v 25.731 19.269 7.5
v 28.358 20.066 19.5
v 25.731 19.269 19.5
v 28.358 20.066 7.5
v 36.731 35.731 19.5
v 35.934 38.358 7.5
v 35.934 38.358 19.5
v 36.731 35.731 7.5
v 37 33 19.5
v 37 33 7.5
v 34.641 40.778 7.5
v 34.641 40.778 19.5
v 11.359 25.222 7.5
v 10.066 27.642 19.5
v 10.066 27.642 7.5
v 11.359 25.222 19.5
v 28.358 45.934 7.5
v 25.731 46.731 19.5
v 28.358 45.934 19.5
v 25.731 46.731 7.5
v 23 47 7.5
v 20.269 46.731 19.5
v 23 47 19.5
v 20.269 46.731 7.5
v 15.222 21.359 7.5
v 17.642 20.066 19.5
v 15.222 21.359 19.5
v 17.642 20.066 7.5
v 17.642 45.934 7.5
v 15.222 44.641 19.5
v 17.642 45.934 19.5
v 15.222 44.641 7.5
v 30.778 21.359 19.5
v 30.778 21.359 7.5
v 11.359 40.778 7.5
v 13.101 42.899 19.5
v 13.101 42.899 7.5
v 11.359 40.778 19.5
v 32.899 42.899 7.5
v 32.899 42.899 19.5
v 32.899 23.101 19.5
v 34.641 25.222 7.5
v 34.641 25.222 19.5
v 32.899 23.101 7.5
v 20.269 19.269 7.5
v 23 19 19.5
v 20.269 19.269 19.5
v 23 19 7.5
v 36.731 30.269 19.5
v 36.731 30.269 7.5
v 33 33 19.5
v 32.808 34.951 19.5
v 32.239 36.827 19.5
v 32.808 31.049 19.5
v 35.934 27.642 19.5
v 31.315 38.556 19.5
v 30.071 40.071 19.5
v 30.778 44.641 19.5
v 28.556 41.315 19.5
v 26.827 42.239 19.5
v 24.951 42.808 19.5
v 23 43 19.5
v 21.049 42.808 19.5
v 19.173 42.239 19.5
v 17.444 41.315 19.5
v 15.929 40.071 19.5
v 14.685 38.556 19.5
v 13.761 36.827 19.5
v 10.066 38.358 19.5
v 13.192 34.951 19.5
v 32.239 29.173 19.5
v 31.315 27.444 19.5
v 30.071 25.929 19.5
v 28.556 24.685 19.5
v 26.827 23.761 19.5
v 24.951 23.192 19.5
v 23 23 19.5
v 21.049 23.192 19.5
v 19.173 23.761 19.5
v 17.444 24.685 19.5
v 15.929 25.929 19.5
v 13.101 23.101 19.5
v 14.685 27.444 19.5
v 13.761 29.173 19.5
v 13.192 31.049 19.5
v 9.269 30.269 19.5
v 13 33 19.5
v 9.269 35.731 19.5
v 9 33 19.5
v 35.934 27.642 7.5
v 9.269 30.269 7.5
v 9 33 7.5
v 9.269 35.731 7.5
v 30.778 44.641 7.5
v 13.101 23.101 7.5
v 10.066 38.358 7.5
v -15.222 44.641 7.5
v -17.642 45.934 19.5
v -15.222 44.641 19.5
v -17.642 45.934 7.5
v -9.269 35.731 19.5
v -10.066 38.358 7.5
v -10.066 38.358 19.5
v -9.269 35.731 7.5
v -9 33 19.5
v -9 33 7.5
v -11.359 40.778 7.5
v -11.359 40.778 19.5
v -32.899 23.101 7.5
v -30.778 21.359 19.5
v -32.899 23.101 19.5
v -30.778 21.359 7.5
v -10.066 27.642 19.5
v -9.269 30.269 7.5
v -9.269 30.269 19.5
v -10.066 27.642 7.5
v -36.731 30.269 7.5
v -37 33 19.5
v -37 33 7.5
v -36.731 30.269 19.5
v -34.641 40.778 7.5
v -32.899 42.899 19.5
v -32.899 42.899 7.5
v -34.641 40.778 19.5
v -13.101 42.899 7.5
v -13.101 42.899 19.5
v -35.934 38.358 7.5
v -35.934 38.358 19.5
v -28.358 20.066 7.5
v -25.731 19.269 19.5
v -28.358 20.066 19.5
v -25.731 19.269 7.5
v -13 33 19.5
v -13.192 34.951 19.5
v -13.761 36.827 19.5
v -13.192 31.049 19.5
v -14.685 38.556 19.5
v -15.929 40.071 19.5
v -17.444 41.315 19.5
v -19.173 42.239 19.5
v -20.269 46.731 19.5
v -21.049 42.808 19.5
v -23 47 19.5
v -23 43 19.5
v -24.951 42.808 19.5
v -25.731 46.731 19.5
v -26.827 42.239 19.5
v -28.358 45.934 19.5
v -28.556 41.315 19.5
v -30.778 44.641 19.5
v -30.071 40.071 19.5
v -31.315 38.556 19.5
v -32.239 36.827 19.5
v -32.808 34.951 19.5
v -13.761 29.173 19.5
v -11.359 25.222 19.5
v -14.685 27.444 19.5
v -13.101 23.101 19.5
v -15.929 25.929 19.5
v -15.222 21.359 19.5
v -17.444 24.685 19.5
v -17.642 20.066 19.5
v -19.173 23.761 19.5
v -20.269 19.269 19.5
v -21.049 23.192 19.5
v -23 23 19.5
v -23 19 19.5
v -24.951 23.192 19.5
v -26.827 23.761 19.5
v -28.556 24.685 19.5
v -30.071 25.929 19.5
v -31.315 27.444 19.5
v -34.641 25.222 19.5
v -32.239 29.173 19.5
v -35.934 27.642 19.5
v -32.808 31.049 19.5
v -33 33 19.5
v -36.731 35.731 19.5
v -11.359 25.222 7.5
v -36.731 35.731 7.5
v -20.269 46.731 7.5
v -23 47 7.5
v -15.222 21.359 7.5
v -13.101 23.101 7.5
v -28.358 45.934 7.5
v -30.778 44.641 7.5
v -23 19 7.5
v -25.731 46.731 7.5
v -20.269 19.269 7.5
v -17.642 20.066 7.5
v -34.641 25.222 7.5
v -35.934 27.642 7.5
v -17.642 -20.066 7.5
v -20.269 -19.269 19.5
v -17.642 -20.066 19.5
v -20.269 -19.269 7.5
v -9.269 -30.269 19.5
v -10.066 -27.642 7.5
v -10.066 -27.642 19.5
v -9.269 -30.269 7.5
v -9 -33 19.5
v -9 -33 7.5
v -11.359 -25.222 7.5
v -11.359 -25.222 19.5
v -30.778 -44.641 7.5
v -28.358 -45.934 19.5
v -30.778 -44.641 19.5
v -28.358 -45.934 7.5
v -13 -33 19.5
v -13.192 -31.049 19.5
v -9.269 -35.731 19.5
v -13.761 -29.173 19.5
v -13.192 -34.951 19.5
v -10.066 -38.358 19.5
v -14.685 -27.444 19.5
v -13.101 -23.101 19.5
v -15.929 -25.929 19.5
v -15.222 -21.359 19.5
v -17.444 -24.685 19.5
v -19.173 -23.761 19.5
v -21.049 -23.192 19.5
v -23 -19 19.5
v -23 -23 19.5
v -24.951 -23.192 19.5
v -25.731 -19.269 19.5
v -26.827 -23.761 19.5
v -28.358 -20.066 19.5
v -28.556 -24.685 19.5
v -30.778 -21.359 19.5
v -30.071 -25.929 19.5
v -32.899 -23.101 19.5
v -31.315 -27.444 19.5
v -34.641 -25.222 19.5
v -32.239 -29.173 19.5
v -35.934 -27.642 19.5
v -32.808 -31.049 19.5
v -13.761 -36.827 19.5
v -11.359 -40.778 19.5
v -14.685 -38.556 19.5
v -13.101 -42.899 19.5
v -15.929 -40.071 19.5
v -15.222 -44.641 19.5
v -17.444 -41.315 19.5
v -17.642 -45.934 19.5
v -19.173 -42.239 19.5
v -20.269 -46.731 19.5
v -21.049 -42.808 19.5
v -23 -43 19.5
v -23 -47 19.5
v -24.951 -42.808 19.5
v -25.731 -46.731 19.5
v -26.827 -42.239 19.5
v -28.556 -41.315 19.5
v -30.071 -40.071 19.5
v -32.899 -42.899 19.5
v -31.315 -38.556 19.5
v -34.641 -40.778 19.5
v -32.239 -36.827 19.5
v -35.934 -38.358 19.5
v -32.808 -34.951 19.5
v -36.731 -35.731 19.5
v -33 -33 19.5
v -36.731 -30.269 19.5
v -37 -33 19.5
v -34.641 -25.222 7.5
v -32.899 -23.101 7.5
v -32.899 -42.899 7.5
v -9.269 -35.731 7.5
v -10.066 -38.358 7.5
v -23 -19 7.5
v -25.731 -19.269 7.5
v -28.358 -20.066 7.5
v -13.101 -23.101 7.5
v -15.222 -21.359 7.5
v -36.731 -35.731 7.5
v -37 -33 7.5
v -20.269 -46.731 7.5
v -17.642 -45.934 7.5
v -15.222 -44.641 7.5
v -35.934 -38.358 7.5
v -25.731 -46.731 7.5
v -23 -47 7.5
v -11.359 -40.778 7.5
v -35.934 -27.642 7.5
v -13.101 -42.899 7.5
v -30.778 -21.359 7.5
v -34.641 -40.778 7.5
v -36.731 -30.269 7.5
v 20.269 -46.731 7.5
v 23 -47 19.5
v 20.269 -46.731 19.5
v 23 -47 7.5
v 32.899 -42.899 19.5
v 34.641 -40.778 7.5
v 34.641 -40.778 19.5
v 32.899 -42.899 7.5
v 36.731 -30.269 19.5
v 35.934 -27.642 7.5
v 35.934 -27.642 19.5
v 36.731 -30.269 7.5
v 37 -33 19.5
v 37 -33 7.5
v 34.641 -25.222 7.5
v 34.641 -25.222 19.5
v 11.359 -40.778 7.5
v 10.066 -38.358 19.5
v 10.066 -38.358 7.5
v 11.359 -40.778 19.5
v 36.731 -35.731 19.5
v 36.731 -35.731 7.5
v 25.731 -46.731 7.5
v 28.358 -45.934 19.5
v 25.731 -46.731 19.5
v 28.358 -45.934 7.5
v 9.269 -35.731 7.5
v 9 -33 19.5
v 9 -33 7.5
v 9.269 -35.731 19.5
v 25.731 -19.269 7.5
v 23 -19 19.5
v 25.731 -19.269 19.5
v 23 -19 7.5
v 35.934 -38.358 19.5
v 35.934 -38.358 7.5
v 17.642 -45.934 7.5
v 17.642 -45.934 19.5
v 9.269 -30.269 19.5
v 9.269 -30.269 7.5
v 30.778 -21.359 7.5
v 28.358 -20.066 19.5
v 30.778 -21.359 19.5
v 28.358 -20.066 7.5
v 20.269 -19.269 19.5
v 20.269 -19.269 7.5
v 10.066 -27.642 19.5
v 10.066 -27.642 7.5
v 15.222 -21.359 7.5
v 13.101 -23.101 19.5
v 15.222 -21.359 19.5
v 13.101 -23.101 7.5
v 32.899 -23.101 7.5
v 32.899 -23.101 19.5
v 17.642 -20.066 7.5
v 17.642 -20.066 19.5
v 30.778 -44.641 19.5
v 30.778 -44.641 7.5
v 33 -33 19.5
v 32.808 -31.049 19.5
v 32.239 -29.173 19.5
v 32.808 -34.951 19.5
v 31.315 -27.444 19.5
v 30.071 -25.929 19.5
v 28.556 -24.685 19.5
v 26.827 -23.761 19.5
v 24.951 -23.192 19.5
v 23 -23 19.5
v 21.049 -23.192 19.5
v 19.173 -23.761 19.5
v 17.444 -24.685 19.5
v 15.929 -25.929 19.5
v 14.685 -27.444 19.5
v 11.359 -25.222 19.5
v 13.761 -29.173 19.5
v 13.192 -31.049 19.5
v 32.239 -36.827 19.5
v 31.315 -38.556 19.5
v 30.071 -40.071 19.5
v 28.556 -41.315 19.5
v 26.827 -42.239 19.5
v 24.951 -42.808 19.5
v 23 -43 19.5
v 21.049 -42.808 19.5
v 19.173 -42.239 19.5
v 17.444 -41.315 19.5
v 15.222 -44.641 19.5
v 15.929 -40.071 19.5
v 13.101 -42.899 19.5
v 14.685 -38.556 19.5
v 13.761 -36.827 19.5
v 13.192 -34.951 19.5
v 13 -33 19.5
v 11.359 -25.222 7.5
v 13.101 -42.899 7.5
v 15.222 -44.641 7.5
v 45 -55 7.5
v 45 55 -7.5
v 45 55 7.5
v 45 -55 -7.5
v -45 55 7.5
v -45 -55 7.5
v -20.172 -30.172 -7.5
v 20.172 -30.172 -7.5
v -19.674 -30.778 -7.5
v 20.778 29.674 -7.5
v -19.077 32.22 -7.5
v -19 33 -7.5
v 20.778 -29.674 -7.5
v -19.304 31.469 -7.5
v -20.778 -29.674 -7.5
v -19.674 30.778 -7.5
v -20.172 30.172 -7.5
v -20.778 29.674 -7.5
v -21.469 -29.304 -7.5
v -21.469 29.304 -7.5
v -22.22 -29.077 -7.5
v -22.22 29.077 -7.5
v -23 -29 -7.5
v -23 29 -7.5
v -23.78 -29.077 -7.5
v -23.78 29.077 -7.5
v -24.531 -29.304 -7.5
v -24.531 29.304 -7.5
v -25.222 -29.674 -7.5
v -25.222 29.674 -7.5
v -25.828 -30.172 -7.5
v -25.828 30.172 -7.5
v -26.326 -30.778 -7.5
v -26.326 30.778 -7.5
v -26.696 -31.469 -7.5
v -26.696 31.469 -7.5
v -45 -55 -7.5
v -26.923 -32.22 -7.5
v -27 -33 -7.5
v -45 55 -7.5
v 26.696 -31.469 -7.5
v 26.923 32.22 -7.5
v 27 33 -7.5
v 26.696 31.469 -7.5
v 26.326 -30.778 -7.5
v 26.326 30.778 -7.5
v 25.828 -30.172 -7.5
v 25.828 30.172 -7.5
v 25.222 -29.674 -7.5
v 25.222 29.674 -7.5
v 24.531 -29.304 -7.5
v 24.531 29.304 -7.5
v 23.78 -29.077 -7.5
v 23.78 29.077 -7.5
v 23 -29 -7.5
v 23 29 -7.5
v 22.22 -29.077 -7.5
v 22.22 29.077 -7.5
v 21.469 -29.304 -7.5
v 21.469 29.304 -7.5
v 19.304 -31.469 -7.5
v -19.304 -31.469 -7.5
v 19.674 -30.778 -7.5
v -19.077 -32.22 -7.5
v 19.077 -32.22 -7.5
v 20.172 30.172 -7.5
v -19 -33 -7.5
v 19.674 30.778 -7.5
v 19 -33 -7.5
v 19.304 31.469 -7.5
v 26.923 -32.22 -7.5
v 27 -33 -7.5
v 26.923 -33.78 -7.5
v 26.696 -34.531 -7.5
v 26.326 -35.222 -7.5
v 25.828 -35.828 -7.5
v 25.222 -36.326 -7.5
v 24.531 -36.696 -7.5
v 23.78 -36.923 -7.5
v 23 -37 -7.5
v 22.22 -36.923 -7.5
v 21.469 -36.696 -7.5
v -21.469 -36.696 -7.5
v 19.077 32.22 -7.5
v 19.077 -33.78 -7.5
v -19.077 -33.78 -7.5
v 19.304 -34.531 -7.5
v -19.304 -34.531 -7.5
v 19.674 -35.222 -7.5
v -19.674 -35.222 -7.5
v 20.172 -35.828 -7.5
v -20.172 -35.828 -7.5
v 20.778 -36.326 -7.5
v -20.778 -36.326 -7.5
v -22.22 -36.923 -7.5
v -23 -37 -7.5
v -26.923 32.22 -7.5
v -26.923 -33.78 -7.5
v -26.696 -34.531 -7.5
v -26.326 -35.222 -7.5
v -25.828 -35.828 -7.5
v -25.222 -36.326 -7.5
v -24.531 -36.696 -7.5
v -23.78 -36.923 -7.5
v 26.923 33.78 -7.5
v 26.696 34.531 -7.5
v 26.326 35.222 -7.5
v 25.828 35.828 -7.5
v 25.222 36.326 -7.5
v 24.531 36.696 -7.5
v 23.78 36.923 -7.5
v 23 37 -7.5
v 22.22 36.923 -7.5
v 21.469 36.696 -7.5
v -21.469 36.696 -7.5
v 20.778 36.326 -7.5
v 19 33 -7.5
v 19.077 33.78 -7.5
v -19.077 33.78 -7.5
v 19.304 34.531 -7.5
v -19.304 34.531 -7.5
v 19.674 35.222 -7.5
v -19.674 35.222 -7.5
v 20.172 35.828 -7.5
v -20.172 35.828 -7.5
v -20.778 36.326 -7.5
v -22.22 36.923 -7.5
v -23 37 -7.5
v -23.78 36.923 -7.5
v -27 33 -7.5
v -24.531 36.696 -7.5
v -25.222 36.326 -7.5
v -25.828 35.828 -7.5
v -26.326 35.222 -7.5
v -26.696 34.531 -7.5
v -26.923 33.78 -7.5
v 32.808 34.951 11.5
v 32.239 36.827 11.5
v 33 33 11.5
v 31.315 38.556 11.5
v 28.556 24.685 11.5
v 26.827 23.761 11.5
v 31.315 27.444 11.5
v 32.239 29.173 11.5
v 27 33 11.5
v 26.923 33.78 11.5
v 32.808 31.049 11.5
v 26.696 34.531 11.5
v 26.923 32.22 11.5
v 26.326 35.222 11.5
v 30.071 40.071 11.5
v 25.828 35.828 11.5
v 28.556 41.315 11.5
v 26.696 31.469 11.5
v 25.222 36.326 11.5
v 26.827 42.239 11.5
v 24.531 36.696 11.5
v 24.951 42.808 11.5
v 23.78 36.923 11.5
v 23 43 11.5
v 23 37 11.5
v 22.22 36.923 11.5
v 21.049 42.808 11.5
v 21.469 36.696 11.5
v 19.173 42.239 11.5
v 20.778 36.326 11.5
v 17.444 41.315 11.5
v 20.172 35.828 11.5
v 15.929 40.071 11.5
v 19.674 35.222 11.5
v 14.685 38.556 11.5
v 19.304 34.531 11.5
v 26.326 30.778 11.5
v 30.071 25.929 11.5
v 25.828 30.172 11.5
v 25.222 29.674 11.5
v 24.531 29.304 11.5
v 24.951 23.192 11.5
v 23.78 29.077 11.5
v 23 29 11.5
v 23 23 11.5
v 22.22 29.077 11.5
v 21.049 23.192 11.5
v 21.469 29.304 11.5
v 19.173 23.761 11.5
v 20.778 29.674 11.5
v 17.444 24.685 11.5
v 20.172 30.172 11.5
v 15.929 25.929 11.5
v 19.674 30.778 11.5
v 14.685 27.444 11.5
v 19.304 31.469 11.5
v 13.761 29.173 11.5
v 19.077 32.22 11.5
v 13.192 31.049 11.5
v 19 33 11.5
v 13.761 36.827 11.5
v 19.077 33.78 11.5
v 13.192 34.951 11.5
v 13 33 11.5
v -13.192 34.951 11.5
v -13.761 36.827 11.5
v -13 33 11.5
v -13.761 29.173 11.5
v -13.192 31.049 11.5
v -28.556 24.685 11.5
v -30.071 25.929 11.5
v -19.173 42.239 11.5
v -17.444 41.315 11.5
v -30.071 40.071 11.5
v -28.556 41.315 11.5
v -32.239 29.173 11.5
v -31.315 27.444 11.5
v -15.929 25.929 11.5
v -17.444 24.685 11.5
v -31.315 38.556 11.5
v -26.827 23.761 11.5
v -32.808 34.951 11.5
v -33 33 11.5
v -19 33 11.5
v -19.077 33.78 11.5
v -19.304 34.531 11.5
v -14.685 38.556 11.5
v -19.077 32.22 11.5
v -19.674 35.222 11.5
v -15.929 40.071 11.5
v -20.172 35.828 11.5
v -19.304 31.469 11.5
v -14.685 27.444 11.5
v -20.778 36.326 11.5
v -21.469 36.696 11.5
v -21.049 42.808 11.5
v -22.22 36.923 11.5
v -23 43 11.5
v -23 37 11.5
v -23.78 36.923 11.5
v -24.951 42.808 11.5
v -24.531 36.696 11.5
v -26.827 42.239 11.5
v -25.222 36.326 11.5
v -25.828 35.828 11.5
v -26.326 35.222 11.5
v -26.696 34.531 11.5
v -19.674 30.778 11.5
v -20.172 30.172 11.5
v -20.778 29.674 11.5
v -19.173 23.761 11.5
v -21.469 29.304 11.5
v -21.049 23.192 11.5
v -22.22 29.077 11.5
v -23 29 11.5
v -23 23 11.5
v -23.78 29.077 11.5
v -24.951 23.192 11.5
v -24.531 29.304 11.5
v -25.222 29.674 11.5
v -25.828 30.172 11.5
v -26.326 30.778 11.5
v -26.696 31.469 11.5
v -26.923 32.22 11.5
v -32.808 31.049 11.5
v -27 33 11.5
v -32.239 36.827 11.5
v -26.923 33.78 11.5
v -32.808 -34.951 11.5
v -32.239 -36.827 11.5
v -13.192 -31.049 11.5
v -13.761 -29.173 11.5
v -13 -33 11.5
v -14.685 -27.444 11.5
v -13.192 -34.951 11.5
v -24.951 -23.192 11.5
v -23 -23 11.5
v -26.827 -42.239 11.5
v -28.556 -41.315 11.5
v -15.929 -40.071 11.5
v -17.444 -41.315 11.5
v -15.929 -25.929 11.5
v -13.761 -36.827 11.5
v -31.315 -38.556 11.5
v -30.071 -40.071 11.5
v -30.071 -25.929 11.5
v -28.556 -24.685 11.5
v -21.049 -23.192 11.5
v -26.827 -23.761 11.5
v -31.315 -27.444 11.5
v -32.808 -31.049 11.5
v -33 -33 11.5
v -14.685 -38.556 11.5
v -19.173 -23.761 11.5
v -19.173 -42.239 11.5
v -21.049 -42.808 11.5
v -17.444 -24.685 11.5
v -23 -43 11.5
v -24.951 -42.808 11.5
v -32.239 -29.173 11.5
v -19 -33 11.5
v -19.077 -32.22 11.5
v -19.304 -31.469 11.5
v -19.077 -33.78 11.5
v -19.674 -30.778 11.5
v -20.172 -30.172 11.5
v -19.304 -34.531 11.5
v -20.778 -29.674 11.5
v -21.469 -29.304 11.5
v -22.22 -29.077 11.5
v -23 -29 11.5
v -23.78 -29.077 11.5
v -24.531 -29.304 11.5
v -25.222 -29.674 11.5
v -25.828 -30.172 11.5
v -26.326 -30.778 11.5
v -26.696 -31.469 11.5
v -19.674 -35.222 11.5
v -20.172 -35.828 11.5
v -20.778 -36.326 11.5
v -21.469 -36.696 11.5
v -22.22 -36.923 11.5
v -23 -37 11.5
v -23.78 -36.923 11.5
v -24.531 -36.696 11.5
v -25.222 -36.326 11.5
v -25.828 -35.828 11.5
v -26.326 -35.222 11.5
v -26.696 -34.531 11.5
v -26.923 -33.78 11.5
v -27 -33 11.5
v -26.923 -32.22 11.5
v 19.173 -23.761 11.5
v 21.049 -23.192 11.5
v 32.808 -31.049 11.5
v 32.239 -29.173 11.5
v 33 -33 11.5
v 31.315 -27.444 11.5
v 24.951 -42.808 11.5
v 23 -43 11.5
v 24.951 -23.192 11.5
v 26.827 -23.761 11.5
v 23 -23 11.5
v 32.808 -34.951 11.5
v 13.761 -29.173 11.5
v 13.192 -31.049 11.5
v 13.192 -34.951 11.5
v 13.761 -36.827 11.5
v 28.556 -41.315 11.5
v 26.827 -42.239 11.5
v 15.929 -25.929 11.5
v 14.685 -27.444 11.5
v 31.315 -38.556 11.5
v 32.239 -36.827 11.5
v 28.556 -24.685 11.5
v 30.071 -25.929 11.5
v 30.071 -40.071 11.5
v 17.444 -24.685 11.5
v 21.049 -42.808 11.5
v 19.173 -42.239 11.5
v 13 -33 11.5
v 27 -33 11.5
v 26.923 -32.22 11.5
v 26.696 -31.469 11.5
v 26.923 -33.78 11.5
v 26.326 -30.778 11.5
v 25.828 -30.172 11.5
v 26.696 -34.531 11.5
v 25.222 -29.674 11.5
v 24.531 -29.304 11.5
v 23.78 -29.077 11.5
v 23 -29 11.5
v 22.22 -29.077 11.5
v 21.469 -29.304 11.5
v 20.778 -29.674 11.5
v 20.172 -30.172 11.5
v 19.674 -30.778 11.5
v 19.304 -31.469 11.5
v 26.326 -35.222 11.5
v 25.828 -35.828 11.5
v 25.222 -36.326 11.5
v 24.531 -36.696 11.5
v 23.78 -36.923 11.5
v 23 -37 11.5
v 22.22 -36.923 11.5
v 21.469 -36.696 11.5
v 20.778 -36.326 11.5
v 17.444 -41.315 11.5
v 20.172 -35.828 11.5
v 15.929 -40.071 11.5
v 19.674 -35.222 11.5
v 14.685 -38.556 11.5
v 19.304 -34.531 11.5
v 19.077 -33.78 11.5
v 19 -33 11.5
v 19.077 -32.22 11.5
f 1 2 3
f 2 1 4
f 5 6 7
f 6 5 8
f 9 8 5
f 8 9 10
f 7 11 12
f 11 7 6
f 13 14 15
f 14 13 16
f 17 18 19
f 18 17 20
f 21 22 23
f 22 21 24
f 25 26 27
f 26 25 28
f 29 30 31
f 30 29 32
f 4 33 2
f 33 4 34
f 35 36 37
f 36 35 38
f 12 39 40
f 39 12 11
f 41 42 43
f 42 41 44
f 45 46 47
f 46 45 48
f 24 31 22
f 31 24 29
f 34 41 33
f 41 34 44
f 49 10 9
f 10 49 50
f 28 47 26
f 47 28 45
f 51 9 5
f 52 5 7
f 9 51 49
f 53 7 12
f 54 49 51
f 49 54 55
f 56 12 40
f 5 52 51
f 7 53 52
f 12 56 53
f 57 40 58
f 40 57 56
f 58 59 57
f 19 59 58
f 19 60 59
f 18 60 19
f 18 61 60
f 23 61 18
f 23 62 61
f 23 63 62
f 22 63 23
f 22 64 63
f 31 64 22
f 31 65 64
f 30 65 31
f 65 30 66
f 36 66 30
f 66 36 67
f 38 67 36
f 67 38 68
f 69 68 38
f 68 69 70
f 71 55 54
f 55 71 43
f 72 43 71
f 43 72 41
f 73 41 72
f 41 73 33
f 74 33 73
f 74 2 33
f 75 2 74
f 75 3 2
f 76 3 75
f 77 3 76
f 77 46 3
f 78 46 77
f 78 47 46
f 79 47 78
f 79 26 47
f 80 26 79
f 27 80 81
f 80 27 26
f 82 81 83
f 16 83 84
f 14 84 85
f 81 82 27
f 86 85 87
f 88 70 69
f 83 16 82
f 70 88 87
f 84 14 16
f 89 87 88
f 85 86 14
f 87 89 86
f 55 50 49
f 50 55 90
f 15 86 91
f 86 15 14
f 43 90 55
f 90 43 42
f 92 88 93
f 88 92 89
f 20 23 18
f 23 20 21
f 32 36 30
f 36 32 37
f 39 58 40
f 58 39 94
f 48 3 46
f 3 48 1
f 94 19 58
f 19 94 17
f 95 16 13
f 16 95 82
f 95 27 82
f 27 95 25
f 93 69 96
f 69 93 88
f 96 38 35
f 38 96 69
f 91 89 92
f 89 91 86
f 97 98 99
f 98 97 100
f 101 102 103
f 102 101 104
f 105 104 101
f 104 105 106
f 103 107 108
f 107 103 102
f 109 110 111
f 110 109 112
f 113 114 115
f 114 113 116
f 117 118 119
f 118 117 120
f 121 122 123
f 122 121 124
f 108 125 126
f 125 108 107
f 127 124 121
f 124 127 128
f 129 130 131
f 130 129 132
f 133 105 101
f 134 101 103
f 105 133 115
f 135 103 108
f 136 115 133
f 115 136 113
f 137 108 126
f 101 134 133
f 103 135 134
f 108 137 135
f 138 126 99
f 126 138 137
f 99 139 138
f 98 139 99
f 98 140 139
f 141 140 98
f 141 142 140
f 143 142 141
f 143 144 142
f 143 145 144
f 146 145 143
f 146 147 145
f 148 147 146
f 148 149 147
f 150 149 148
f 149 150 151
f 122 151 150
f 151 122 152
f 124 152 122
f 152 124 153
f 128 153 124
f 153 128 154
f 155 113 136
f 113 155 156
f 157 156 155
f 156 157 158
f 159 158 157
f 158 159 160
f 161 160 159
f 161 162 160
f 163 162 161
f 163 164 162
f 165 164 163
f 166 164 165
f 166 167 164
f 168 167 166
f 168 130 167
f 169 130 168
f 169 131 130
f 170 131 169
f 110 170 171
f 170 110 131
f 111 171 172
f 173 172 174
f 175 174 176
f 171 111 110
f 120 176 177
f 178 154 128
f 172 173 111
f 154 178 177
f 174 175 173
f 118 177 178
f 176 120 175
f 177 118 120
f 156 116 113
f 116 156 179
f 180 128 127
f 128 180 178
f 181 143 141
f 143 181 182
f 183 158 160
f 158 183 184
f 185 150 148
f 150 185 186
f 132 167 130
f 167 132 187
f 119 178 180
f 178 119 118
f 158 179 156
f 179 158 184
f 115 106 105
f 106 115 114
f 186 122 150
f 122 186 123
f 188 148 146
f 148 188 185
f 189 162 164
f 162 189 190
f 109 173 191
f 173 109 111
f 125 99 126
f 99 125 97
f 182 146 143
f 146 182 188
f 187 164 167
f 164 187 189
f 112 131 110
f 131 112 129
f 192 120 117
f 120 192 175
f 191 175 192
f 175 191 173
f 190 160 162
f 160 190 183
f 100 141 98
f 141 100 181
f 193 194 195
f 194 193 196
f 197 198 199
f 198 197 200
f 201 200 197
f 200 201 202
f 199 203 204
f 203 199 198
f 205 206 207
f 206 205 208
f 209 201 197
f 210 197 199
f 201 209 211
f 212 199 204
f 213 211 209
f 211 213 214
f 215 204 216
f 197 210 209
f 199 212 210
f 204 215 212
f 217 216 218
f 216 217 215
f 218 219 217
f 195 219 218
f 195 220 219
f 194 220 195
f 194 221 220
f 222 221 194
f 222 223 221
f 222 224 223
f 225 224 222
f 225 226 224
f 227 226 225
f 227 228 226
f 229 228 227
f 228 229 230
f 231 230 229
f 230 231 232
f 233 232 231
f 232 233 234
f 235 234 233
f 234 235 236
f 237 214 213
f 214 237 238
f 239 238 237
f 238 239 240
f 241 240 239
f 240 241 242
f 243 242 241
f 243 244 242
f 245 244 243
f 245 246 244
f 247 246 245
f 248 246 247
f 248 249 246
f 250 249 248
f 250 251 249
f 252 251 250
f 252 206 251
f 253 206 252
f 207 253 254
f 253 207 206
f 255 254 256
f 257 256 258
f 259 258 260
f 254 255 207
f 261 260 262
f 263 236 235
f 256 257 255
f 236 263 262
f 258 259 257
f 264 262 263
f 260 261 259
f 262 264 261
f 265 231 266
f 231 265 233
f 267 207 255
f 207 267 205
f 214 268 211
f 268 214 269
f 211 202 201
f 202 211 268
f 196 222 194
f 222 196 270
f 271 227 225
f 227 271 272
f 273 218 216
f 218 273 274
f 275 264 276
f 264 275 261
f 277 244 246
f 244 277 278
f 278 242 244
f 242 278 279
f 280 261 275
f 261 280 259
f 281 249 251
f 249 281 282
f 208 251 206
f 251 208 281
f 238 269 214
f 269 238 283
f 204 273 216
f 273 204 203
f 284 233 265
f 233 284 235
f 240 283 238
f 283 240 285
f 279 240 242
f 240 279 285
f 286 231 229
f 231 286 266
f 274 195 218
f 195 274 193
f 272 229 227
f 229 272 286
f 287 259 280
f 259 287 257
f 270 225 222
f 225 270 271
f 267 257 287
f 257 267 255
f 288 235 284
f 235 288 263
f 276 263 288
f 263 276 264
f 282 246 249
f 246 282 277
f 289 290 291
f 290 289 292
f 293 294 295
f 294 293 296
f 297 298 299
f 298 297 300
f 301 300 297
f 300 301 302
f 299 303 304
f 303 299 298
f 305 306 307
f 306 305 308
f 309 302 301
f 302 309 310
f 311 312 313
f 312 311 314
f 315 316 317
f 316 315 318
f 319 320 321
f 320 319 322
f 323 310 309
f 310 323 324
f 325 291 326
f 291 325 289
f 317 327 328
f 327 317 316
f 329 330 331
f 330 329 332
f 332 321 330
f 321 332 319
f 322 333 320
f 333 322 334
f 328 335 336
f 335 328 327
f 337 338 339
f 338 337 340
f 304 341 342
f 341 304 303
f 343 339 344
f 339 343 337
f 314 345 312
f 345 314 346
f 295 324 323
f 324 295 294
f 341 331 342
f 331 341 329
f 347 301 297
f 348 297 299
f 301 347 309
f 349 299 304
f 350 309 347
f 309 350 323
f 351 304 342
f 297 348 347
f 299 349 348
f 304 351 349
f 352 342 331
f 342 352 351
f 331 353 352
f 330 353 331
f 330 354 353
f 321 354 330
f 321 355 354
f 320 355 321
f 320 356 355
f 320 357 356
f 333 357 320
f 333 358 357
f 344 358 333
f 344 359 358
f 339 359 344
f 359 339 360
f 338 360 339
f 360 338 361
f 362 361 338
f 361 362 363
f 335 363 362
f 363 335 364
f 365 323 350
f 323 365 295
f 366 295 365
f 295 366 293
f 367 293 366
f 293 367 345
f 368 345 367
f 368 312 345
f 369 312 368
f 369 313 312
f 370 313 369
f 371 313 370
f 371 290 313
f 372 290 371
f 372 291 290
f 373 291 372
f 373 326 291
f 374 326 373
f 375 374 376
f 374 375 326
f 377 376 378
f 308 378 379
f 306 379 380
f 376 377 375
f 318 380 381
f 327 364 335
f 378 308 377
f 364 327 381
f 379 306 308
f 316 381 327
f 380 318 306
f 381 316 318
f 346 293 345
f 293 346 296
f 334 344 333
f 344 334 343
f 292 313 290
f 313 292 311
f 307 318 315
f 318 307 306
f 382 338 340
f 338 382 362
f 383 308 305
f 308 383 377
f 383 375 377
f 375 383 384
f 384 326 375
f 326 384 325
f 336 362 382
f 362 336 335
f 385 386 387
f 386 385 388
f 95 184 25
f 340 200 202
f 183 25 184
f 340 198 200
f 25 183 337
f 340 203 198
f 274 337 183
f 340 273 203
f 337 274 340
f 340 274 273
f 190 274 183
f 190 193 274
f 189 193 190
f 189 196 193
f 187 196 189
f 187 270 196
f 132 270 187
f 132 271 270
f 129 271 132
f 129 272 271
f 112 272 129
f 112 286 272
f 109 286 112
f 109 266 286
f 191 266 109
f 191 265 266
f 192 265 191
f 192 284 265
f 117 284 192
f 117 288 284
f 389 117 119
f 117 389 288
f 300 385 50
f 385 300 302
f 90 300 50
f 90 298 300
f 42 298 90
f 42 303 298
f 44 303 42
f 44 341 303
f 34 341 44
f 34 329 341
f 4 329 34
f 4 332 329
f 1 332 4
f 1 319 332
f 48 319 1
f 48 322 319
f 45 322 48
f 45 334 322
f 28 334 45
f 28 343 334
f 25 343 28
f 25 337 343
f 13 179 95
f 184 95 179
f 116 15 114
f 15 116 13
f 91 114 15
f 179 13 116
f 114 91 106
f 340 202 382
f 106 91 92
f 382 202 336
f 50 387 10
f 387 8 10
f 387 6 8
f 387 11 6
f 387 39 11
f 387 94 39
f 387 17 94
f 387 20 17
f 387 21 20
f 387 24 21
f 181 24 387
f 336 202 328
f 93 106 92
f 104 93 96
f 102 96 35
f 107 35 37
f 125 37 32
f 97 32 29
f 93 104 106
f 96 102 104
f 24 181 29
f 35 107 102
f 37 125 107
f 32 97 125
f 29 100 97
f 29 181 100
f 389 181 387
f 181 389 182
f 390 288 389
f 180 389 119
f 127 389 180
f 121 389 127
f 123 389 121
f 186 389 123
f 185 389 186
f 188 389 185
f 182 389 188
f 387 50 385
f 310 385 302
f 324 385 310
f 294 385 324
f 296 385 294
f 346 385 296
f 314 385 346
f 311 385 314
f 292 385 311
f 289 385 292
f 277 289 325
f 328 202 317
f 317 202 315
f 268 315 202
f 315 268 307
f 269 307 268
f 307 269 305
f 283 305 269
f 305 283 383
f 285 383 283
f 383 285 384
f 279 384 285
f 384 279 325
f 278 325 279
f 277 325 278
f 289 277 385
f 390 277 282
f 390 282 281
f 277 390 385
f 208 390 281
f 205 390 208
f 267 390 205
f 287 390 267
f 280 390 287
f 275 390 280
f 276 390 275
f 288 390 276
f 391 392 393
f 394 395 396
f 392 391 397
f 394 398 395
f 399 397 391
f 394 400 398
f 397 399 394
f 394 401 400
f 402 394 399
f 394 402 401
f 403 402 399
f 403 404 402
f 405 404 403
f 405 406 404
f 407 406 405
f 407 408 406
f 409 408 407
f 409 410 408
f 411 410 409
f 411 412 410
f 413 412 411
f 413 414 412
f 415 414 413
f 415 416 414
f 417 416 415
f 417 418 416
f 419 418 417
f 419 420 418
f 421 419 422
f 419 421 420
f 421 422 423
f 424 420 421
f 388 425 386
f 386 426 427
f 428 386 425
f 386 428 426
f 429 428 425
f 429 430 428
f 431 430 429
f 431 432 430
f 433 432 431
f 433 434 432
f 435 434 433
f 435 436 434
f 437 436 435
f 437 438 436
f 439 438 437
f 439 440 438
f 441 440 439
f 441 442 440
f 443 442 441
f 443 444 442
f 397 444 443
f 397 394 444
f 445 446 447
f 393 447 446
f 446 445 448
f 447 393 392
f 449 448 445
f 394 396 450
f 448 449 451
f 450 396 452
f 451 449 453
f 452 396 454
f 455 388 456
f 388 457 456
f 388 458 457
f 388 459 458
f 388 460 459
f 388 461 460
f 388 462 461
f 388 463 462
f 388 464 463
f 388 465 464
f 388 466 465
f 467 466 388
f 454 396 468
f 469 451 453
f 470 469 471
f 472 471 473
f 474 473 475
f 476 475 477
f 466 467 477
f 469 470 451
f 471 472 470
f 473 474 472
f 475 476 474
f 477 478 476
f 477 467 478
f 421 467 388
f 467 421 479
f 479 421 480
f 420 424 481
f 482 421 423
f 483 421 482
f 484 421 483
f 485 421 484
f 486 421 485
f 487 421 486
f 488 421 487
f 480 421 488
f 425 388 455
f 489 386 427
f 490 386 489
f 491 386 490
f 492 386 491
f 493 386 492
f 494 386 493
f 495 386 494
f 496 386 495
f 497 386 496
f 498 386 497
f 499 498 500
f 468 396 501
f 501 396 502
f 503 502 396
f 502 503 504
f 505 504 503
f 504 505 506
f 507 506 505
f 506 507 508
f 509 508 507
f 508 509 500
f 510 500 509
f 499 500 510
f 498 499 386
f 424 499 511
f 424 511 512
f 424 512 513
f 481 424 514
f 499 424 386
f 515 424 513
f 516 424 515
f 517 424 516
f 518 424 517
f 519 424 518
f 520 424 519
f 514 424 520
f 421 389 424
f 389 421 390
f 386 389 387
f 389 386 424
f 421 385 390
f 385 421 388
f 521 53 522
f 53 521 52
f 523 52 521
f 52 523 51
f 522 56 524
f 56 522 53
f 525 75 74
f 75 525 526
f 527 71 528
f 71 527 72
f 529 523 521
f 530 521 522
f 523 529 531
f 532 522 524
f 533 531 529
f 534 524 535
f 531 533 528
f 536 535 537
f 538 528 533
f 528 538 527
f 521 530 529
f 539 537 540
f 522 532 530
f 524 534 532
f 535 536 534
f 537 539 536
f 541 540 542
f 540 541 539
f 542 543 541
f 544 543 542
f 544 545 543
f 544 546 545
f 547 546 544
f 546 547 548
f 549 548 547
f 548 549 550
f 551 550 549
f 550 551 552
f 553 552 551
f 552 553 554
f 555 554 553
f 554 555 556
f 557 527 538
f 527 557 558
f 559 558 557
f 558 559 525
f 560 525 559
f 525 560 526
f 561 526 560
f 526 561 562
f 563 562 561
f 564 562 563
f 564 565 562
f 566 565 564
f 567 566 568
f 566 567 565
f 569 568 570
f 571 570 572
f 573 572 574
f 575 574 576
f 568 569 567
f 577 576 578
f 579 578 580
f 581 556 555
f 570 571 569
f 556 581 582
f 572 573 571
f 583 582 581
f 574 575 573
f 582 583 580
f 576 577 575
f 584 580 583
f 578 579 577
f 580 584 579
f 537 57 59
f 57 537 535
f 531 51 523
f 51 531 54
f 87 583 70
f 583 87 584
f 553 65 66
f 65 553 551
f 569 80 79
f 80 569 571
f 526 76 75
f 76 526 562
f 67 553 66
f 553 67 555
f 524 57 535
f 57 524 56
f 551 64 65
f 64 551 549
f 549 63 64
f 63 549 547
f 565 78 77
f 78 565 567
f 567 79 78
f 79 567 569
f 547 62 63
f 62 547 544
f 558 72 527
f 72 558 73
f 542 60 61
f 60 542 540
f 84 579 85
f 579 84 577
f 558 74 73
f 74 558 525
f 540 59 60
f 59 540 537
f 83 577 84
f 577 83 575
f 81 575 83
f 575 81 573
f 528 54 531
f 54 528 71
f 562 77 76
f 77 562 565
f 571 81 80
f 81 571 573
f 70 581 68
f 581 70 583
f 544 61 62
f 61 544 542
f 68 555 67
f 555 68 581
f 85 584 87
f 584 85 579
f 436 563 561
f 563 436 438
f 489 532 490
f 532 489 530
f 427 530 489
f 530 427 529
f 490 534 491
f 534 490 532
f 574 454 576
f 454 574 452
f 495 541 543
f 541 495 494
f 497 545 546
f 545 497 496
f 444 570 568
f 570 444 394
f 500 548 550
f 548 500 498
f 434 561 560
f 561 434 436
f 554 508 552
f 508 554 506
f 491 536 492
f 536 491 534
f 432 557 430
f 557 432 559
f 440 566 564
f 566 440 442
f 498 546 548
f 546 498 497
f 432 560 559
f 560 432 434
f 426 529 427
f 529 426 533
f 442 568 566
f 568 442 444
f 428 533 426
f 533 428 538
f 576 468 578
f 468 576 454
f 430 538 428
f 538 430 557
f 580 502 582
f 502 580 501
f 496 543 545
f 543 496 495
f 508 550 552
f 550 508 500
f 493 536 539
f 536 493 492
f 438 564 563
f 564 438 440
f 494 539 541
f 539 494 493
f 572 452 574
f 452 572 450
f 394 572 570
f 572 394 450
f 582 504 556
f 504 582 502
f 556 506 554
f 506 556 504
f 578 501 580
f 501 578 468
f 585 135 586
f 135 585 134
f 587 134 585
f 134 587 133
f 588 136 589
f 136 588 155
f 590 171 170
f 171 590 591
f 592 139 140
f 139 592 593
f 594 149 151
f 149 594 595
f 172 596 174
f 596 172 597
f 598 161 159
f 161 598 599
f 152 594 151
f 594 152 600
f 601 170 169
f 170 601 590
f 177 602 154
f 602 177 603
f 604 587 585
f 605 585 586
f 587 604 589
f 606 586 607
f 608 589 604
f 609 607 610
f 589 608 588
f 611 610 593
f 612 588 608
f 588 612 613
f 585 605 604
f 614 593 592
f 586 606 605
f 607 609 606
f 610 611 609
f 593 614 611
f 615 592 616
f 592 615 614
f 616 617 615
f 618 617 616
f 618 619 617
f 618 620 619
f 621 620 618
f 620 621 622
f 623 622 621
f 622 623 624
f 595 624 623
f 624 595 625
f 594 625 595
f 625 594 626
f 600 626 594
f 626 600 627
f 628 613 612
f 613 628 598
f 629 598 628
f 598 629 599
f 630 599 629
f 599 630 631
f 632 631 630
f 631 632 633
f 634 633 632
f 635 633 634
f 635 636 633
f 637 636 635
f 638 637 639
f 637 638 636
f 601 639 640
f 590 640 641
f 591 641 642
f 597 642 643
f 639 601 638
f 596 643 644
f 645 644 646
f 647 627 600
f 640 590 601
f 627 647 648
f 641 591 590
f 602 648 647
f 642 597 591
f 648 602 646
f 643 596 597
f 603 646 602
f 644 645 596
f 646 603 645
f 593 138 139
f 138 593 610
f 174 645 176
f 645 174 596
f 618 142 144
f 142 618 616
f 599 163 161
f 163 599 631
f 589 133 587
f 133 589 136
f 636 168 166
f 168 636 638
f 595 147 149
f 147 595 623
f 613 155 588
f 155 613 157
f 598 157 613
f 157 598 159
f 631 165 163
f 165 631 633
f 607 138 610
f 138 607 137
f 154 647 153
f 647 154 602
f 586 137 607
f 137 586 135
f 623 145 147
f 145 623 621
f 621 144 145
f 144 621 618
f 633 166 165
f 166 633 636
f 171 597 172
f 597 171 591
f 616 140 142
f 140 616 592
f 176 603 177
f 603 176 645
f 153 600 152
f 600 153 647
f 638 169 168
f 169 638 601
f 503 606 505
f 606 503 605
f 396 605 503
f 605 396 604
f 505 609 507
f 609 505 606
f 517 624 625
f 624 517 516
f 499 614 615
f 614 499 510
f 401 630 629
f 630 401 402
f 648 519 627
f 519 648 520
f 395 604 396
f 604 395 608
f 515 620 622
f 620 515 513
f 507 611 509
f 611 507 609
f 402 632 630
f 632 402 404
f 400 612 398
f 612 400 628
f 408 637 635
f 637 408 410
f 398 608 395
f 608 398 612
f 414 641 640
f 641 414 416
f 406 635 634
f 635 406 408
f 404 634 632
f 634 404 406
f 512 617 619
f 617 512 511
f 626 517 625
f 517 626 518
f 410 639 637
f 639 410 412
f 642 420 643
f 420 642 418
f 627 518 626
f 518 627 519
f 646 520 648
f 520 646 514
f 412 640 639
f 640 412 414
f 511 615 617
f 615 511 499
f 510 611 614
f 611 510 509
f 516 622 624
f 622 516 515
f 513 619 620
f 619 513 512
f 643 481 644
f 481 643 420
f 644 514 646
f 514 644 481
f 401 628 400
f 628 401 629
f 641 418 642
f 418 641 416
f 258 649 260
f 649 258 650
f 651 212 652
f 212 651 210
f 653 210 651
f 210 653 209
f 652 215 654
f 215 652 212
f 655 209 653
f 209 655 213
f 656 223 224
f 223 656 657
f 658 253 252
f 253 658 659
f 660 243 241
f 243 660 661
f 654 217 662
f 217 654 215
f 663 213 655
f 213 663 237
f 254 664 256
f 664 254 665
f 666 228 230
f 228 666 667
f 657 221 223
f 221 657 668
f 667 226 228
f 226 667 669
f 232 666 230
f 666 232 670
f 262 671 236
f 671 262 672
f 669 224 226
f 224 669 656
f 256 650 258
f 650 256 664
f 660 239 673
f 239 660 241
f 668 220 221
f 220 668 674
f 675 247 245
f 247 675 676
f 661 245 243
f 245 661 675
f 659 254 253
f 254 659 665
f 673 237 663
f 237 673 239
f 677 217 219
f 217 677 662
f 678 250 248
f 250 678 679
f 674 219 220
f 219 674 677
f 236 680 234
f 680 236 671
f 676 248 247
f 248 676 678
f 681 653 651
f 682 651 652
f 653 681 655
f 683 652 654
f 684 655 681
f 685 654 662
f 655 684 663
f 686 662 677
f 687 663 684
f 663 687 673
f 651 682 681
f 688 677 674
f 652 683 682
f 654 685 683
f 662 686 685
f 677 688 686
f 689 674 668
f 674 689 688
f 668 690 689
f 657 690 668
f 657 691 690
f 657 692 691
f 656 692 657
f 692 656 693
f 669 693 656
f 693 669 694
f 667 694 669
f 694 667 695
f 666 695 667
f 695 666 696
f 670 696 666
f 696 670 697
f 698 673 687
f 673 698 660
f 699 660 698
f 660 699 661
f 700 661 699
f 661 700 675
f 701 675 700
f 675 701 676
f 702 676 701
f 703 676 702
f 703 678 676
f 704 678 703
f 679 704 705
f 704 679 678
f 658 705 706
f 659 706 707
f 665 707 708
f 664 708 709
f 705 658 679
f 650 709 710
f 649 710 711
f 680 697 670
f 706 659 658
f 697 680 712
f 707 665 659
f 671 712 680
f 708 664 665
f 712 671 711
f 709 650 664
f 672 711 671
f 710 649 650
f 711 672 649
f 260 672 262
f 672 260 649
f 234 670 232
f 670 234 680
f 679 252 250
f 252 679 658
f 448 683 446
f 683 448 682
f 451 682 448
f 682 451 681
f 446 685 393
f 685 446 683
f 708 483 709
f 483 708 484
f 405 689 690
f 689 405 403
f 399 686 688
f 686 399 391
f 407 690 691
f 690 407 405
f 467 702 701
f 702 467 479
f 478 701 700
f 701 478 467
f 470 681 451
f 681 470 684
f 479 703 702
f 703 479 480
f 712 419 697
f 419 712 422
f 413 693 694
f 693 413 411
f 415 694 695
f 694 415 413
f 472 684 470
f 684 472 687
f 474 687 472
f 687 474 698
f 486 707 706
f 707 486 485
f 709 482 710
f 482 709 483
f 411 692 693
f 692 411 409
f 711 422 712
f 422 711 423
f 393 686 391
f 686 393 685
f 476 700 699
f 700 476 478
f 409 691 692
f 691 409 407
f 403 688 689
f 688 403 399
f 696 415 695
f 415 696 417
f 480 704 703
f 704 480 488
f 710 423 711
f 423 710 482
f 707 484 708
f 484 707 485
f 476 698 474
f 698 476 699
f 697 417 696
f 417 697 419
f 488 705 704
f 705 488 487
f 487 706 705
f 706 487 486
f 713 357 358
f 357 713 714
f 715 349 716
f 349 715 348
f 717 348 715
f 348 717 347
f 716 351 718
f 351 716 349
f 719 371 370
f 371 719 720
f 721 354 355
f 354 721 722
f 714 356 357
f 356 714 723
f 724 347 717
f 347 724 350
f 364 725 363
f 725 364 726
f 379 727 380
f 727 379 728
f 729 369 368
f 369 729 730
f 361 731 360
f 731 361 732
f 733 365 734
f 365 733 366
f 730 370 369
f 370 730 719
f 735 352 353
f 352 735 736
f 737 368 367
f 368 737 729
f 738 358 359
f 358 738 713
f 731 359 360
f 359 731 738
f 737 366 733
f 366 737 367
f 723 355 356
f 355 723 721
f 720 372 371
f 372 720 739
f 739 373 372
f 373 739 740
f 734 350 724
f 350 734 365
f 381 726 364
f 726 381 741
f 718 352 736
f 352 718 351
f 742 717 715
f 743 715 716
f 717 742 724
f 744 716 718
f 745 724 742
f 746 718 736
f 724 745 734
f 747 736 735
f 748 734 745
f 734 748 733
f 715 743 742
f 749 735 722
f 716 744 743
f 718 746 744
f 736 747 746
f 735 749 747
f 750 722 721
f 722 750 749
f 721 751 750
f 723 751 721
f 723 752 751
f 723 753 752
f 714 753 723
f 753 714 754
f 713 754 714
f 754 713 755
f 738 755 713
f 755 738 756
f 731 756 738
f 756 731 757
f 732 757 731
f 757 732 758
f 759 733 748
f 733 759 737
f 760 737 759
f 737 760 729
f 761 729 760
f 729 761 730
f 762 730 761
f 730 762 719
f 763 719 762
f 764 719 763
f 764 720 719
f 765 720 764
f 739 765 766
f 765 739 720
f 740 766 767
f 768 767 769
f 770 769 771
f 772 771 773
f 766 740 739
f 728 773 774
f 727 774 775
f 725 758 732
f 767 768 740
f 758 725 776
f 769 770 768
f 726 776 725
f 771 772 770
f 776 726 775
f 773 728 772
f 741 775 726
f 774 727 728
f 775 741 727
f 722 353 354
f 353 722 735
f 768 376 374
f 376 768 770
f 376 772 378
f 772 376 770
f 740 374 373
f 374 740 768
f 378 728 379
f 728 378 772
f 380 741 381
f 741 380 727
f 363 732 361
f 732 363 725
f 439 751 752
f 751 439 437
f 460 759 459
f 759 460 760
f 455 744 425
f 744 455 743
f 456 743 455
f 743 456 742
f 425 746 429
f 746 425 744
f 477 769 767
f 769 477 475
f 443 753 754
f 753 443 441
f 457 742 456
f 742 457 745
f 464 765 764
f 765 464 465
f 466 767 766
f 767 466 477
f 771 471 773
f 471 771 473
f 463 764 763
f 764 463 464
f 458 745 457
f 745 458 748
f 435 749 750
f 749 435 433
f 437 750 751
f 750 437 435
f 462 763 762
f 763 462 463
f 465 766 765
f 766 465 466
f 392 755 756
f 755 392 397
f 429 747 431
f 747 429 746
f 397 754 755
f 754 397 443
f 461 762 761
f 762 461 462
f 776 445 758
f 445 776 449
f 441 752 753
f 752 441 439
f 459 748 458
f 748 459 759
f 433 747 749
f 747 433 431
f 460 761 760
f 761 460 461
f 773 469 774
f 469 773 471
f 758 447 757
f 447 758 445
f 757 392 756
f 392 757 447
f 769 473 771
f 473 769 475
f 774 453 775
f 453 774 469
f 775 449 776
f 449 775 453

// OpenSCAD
$fn = 32;

// ----------------------------------------------------------------------
// Socket pad plate
// bosses with counterbored sockets for the screws
// ----------------------------------------------------------------------

// --- parameters (mm) ---
base_t = 15;            // base plate thickness
boss_h = 12;            // boss height above the base plate
boss_d = 28;            // boss diameter
socket_d = 20;          // socket diameter
socket_depth = 8;       // socket depth from the boss face
bolt_d = 8;             // screw clearance hole through the socket floor
plate = [90, 110, 15];  // overall size (x, y, z)
edge = 22;              // boss centre offset from the plate edge
pads = 4;               // boss count, one per corner

// --- derived feature positions (mm) ---
height = base_t + boss_h;        // = 27   overall height of the part
corner_x = plate[0] / 2 - edge;  // = 23   boss centre X
corner_y = plate[1] / 2 - edge;  // = 33   boss centre Y
feature_centers = [
  [corner_x, corner_y],
  [-corner_x, corner_y],
  [-corner_x, -corner_y],
  [corner_x, -corner_y]
];   // boss centres: sockets, holes and the pads themselves are placed from here

// base plate, bosses on feature_centers, socket + through hole in each
difference() {
  union() {
    cube(plate, center = true);
    for (centre = feature_centers)
      translate([centre[0], centre[1], plate[2] / 2 - 1])
        cylinder(d = boss_d, h = boss_h + 1);
  }
  for (centre = feature_centers) {
    translate([centre[0], centre[1], plate[2] / 2 + boss_h - socket_depth])
      cylinder(d = socket_d, h = socket_depth + 1);
    translate([centre[0], centre[1], -height])
      cylinder(d = bolt_d, h = 2 * height + 2);  // through the socket floor
  }
}
